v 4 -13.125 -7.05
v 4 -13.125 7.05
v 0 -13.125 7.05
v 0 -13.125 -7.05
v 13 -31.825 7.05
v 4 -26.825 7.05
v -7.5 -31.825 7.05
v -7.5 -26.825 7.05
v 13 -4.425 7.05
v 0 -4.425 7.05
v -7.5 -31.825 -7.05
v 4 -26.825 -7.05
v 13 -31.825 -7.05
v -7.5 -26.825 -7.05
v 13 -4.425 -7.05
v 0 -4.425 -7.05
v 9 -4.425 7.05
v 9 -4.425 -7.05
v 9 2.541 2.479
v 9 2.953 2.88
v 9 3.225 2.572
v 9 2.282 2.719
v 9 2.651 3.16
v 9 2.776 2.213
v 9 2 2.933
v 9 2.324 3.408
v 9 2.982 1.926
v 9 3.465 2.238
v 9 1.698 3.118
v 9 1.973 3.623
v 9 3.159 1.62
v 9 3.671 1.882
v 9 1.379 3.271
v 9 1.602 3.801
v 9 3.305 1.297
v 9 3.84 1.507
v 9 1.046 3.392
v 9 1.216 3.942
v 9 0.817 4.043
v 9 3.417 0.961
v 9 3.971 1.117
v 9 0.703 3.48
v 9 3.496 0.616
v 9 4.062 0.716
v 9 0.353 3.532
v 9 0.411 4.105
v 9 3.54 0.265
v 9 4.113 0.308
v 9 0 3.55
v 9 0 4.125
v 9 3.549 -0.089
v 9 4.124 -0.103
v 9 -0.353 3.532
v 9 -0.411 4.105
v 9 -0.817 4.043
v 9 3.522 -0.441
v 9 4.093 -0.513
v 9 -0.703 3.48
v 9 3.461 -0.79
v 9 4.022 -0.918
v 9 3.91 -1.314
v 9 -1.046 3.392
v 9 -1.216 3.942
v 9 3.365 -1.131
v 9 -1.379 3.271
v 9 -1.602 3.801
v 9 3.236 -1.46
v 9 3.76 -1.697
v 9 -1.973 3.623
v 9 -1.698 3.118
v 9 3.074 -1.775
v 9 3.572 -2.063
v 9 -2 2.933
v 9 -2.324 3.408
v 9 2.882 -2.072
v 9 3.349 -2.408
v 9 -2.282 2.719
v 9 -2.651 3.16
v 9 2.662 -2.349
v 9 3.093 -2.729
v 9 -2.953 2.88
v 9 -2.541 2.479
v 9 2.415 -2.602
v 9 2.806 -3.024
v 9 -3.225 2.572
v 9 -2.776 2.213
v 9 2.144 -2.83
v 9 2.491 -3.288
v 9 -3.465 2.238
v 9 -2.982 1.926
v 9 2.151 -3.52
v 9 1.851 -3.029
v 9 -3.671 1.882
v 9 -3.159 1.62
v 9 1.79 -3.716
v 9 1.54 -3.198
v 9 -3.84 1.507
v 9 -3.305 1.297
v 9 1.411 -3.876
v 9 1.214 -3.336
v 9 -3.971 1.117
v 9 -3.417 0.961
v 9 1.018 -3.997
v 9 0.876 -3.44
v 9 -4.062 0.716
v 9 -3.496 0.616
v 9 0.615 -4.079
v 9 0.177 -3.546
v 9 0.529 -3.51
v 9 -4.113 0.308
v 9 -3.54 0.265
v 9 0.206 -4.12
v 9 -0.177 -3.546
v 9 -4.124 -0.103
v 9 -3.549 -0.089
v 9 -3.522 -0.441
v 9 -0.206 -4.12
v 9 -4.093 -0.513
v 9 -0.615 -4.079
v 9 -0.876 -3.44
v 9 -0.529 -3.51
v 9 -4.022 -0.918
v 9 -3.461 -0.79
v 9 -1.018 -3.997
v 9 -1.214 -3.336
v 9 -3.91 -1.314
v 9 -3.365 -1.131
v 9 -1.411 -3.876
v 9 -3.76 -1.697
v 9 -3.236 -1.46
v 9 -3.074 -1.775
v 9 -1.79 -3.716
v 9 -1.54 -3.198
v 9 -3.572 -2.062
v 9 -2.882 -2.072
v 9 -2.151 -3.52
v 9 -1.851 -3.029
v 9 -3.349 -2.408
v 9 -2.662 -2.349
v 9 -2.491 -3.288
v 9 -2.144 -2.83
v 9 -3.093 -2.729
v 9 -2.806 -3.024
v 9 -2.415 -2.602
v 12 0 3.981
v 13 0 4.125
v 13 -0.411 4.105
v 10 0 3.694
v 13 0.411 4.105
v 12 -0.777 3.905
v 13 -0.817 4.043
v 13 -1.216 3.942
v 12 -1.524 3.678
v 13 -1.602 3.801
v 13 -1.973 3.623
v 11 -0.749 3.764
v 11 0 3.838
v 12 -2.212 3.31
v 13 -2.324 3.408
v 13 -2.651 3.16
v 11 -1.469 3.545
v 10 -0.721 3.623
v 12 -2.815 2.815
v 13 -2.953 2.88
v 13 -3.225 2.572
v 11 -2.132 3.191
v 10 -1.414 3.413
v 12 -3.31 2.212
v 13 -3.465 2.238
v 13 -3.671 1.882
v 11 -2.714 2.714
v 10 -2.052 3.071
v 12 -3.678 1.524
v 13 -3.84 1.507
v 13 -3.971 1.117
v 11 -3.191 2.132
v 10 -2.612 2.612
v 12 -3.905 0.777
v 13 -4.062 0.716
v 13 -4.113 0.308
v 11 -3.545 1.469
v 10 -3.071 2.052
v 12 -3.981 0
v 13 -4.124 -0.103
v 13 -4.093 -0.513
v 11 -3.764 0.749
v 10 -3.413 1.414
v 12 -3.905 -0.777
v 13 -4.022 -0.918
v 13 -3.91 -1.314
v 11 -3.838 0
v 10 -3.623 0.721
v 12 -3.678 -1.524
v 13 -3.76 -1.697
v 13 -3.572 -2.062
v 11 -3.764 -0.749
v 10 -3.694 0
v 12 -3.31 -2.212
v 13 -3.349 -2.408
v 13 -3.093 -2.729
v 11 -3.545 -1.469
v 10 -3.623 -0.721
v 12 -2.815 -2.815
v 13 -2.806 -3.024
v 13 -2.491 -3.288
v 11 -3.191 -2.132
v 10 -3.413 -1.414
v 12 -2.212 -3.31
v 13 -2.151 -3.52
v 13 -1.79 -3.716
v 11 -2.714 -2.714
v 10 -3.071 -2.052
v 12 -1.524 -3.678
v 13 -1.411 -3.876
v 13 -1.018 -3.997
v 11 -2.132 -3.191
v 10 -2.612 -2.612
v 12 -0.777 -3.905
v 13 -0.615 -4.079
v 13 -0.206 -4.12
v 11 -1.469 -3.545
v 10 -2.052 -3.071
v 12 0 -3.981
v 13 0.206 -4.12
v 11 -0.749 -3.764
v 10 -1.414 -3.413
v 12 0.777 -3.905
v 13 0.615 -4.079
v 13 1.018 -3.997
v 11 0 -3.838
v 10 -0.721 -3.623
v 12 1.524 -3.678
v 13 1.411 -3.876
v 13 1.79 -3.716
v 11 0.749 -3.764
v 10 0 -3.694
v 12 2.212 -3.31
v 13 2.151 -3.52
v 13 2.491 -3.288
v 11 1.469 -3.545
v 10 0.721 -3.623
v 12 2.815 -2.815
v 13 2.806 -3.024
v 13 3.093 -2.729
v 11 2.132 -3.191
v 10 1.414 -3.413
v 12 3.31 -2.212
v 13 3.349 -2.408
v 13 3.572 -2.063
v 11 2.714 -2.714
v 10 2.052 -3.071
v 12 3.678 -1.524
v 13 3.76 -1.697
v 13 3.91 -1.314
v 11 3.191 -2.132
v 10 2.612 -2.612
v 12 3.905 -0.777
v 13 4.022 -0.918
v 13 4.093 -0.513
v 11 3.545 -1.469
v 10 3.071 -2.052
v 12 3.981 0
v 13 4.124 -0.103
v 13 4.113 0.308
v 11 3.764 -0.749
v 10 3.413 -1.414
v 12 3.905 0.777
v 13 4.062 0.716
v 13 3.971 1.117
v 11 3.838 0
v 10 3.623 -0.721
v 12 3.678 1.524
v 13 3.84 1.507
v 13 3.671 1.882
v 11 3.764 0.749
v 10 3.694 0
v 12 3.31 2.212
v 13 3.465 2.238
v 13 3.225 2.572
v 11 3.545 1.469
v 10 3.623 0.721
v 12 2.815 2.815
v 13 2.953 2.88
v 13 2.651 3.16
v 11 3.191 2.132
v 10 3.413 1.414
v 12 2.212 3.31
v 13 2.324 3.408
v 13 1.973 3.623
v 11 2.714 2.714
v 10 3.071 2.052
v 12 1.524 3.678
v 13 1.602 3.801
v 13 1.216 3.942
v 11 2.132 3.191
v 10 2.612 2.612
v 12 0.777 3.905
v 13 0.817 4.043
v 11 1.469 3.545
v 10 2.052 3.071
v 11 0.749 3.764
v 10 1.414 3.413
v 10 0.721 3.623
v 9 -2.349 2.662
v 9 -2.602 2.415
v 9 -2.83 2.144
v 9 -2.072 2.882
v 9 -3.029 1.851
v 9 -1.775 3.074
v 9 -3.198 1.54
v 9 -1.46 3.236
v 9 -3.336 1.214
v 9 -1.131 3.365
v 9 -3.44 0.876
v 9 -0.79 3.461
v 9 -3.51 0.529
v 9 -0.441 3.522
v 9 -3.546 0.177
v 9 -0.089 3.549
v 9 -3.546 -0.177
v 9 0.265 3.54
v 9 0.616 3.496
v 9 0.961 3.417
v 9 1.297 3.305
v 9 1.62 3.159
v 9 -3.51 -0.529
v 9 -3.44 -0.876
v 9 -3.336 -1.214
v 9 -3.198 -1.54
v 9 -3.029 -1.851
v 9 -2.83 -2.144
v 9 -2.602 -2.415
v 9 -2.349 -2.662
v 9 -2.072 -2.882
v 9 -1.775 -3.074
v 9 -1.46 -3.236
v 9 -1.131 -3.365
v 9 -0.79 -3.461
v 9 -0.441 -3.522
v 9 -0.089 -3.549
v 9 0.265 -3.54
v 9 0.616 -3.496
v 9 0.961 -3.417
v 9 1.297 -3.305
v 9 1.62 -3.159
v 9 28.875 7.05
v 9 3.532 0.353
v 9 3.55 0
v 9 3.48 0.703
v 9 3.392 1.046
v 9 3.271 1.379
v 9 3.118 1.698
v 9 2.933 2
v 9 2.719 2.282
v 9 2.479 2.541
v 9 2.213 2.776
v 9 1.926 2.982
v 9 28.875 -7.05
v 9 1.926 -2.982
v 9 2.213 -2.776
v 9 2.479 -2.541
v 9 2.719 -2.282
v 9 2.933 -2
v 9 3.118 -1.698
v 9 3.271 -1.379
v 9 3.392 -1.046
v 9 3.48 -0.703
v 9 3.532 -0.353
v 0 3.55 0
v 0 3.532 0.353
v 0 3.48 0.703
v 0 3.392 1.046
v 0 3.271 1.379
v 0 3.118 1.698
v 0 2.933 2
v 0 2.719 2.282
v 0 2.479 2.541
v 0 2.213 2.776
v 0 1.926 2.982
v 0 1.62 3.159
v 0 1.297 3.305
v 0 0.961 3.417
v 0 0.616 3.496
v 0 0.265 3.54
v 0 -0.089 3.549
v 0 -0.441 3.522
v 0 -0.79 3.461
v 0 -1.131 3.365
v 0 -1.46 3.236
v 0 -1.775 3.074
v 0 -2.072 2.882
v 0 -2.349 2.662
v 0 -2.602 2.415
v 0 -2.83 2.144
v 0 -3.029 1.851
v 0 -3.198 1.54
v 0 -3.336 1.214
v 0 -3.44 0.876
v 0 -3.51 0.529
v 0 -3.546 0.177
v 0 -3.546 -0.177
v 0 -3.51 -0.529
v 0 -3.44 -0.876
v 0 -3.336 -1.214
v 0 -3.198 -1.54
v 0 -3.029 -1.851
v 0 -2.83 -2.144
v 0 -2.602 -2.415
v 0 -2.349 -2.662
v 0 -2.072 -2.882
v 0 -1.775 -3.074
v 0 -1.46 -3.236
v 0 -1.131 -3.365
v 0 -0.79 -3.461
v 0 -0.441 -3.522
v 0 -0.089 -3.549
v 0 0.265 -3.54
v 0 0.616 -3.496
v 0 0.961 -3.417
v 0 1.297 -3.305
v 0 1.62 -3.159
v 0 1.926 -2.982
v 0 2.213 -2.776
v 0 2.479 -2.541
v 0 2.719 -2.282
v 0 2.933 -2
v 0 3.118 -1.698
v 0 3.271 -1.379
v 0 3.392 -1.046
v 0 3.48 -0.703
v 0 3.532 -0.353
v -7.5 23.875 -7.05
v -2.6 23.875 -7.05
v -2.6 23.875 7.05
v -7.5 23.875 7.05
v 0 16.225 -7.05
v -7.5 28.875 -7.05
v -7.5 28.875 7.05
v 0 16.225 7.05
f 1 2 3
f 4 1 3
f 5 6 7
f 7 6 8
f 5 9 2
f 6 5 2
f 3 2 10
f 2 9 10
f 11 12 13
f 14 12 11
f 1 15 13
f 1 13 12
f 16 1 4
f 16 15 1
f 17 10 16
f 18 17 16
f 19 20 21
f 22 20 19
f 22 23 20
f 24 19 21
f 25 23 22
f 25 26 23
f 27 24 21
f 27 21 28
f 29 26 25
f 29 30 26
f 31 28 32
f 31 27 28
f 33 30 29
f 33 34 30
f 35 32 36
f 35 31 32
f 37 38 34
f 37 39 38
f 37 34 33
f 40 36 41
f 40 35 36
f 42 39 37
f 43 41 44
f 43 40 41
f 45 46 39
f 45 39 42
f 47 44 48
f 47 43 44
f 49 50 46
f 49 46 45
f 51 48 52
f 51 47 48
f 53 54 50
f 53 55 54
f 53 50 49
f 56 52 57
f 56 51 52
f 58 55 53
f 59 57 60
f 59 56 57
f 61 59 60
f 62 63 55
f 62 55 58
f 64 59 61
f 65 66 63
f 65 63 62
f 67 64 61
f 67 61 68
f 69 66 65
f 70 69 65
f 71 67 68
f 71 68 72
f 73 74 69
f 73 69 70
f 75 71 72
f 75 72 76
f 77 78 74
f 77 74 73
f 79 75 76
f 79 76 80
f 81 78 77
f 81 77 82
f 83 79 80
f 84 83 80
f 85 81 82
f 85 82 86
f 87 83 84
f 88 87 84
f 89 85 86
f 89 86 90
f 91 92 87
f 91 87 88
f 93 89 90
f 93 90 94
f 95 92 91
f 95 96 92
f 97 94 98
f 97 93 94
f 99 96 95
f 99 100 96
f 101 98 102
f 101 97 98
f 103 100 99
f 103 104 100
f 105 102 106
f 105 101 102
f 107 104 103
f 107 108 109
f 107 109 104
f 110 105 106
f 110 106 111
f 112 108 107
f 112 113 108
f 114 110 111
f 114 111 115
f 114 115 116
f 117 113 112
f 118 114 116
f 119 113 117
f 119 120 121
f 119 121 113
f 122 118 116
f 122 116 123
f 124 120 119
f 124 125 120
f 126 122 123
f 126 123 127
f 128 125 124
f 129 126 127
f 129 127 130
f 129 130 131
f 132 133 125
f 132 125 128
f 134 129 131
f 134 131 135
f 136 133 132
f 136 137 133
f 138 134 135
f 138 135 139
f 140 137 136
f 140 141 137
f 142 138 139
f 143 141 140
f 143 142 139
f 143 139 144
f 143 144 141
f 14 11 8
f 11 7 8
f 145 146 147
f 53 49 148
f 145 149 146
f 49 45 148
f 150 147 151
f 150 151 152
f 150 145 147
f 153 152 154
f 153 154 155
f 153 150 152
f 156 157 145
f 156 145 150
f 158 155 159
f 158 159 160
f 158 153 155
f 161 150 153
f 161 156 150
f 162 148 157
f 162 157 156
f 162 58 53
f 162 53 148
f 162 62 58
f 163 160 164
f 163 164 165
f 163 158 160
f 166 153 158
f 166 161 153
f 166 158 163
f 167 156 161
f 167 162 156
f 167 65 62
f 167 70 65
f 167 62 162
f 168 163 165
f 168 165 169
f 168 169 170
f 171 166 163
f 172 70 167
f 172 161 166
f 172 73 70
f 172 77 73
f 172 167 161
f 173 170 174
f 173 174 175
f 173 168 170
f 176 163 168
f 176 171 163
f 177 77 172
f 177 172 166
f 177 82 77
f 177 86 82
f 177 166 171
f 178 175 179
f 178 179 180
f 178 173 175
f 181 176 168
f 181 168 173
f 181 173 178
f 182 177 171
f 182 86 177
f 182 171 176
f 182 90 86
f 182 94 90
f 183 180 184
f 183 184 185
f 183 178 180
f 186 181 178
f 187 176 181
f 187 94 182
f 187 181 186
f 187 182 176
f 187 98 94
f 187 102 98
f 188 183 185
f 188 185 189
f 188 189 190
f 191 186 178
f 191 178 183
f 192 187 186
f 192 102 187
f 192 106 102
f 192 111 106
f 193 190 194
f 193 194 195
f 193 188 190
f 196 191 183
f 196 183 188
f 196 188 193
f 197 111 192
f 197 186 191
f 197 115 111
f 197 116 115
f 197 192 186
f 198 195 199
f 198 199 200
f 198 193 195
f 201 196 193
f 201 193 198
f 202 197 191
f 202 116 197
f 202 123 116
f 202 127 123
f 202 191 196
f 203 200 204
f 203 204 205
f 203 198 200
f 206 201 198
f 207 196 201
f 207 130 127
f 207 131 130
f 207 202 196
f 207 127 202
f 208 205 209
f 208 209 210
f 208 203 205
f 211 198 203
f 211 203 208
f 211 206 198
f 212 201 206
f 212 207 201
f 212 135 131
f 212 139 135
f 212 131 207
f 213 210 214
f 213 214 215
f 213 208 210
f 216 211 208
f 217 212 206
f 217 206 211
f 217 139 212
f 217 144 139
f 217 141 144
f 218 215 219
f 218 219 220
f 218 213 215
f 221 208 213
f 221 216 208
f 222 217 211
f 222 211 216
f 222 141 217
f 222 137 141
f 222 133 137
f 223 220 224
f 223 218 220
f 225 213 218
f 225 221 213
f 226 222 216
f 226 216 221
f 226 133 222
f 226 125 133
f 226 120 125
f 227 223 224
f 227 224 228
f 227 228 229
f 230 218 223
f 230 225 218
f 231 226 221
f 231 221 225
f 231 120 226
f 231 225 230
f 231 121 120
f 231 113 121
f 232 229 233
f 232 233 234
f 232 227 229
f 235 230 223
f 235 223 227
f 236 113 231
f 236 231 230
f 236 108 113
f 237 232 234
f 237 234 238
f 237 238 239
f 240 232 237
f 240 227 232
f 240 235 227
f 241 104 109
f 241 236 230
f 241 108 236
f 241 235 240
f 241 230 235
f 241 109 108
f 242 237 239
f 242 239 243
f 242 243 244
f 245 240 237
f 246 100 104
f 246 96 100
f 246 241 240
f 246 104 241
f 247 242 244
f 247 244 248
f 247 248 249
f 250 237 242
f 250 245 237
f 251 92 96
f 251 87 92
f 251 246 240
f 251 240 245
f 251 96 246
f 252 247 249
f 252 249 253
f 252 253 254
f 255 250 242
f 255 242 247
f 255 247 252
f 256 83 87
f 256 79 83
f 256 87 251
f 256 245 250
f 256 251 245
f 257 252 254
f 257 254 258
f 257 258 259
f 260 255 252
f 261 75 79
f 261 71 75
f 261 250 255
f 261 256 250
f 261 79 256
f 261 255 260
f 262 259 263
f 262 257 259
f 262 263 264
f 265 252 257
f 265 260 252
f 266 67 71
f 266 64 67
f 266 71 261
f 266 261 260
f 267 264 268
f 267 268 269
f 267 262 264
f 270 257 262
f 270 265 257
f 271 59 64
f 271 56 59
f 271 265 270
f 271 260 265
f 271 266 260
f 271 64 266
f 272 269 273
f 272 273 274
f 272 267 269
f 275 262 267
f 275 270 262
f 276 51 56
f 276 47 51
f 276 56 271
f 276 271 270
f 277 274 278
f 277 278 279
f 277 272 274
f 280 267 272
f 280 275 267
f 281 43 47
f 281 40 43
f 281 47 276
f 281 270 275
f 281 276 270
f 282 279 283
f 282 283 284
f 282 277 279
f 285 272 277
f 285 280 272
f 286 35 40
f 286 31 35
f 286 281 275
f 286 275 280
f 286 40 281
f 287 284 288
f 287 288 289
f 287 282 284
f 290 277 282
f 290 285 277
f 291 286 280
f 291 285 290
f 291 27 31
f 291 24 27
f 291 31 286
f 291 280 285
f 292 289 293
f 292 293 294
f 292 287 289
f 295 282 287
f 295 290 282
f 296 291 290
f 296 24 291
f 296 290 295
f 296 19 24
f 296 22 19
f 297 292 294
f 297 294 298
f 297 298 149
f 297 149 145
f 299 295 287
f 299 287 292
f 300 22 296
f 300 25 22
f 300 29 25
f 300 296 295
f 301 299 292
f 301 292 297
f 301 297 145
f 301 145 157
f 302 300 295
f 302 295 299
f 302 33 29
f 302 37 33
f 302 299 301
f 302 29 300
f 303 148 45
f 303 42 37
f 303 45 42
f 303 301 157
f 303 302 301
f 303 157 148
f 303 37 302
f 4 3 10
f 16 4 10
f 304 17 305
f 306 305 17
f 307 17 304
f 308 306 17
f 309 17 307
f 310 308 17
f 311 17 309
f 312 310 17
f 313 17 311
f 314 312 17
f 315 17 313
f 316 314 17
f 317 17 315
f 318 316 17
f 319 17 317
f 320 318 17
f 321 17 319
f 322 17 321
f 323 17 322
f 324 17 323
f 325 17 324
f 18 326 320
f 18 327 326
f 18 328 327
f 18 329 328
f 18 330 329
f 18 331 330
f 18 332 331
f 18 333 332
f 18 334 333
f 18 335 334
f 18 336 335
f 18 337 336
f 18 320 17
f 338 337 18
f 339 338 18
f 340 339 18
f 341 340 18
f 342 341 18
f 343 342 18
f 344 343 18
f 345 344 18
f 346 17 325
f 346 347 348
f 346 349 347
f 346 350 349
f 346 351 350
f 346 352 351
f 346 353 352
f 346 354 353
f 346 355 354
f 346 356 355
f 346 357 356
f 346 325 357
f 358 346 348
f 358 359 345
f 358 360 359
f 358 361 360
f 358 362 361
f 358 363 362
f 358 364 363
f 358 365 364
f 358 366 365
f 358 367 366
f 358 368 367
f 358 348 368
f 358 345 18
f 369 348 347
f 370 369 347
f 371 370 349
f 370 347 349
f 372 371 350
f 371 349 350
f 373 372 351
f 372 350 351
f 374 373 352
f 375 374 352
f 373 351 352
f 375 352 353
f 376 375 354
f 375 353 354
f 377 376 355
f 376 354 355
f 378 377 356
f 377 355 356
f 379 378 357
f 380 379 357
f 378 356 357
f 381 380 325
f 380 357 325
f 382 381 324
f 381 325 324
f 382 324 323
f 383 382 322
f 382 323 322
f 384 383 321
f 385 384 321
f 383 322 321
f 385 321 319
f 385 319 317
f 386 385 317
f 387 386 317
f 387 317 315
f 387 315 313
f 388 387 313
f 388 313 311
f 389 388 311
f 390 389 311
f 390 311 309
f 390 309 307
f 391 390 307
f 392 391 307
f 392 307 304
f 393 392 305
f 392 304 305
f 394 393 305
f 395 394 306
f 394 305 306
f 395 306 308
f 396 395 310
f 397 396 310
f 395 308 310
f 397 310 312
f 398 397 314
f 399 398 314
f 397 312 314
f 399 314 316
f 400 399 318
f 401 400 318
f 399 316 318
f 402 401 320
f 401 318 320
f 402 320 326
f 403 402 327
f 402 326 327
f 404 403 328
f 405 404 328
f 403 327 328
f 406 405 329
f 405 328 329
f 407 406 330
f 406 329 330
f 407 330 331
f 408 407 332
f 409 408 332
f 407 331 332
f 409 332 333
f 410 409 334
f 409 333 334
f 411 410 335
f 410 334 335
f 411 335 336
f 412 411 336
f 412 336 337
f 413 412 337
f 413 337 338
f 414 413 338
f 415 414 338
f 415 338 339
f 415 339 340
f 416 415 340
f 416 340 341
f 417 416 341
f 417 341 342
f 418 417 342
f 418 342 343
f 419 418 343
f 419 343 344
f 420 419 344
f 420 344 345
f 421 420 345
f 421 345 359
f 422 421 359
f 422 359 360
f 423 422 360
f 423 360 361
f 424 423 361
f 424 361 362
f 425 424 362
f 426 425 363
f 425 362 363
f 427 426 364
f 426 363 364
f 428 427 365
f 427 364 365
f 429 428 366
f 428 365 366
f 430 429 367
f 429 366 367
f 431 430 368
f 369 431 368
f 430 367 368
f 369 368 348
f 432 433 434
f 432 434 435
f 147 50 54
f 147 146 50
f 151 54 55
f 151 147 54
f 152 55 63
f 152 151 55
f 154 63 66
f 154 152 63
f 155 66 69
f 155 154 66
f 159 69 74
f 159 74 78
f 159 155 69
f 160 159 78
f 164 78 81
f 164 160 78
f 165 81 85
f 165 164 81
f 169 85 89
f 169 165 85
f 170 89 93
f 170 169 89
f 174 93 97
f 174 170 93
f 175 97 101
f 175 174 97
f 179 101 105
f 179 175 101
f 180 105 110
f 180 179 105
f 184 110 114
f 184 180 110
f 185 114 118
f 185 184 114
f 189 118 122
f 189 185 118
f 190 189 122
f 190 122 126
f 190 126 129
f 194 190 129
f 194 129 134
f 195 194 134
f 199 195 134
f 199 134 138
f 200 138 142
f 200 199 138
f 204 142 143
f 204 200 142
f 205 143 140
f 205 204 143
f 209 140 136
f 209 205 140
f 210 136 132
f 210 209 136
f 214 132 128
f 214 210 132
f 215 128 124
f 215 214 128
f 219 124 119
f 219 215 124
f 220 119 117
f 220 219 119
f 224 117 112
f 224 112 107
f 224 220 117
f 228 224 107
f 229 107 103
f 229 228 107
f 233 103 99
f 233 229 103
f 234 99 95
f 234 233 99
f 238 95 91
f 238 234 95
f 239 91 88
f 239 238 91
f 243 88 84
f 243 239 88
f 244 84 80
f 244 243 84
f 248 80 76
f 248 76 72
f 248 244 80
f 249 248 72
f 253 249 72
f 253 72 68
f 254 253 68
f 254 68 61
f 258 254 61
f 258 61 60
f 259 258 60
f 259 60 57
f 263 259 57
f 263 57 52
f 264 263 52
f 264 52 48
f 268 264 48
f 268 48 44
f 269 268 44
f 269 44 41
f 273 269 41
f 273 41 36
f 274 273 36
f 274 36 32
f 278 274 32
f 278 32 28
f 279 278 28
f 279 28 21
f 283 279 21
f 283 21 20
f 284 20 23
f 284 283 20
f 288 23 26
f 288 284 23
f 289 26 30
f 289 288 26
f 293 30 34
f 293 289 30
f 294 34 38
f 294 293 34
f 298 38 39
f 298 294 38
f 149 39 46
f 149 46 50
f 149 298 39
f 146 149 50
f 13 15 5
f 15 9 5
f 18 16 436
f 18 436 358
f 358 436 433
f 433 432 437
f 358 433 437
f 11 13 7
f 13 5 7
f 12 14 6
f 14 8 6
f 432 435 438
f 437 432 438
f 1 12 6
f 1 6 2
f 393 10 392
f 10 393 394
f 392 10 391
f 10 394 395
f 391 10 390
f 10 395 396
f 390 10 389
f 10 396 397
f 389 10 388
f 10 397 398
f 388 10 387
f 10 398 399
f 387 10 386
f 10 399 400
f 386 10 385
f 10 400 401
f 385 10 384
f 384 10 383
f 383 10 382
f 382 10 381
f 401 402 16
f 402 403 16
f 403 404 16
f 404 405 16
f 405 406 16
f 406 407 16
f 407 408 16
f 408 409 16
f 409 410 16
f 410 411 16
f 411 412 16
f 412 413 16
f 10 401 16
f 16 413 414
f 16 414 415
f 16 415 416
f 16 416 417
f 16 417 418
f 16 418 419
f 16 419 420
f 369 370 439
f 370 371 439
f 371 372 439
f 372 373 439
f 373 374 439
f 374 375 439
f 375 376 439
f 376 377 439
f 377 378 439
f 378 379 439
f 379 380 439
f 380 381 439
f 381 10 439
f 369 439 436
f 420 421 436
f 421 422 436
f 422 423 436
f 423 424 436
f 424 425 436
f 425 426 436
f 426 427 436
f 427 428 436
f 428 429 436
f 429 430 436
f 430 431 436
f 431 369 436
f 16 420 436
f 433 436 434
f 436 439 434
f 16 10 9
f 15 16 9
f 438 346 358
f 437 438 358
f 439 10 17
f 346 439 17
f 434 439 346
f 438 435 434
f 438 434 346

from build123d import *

# Parameters (mm, degrees)
BOSS_EXTRUDE1_DEPTH   = 7.05
BOSS_EXTRUDE1_2_DEPTH = 7.05
SKETCH3_W             = 14.1
SKETCH3_H             = 33.3
BOSS_EXTRUDE7_DEPTH   = 9
SKETCH4_R             = 3.55
CUT_EXTRUDE1_DEPTH    = 9


with BuildPart() as part:
    # Sketch1 → Revolve1 (revolve)
    with BuildSketch(Plane.XY, mode=Mode.PRIVATE) as revolve1_sk:
        Polygon((9, 4.125), (13, 4.125), (9, 3.55), align=None)
    revolve(revolve1_sk.sketch.rotate(Axis((9, 0, 0), (1, 0, 0)), 90), axis=Axis((9, 0, 0), (1, 0, 0)))


with BuildPart() as body_2:
    # Sketch2 → Boss-Extrude1 (new, symmetric)
    with BuildSketch(Plane.XY):
        Polygon((0, -4.425), (13, -4.425), (13, -31.825), (-7.5, -31.825), (-7.5, -26.825), (4, -26.825), (4, -13.125), (0, -13.125), align=None)
    extrude(amount=BOSS_EXTRUDE1_DEPTH, both=True)


with BuildPart() as body_3:
    # Sketch2 → Boss-Extrude1 2 (new, symmetric)
    with BuildSketch(Plane.XY):
        Polygon((0, 28.875), (0, 16.225), (-2.6, 23.875), (-7.5, 23.875), (-7.5, 28.875), align=None)
    extrude(amount=BOSS_EXTRUDE1_2_DEPTH, both=True)

    # Sketch3 → Boss-Extrude7 (add)
    with BuildSketch(Plane(origin=(0, 0, 0), x_dir=(0, 0, -1), z_dir=(1, 0, 0))):
        with Locations((0, 12.225)):
            Rectangle(SKETCH3_W, SKETCH3_H)
    extrude(amount=BOSS_EXTRUDE7_DEPTH)

    # Sketch4 → Cut-Extrude1 (cut)
    with BuildSketch(Plane(origin=(9, 0, 0), x_dir=(0, 0, -1), z_dir=(1, 0, 0))):
        with Locations(Location((0, 0, 0), (0, 0, 90))):
            Circle(SKETCH4_R)
    extrude(amount=-CUT_EXTRUDE1_DEPTH, mode=Mode.SUBTRACT)


solid = Compound([part.part, body_2.part, body_3.part])
